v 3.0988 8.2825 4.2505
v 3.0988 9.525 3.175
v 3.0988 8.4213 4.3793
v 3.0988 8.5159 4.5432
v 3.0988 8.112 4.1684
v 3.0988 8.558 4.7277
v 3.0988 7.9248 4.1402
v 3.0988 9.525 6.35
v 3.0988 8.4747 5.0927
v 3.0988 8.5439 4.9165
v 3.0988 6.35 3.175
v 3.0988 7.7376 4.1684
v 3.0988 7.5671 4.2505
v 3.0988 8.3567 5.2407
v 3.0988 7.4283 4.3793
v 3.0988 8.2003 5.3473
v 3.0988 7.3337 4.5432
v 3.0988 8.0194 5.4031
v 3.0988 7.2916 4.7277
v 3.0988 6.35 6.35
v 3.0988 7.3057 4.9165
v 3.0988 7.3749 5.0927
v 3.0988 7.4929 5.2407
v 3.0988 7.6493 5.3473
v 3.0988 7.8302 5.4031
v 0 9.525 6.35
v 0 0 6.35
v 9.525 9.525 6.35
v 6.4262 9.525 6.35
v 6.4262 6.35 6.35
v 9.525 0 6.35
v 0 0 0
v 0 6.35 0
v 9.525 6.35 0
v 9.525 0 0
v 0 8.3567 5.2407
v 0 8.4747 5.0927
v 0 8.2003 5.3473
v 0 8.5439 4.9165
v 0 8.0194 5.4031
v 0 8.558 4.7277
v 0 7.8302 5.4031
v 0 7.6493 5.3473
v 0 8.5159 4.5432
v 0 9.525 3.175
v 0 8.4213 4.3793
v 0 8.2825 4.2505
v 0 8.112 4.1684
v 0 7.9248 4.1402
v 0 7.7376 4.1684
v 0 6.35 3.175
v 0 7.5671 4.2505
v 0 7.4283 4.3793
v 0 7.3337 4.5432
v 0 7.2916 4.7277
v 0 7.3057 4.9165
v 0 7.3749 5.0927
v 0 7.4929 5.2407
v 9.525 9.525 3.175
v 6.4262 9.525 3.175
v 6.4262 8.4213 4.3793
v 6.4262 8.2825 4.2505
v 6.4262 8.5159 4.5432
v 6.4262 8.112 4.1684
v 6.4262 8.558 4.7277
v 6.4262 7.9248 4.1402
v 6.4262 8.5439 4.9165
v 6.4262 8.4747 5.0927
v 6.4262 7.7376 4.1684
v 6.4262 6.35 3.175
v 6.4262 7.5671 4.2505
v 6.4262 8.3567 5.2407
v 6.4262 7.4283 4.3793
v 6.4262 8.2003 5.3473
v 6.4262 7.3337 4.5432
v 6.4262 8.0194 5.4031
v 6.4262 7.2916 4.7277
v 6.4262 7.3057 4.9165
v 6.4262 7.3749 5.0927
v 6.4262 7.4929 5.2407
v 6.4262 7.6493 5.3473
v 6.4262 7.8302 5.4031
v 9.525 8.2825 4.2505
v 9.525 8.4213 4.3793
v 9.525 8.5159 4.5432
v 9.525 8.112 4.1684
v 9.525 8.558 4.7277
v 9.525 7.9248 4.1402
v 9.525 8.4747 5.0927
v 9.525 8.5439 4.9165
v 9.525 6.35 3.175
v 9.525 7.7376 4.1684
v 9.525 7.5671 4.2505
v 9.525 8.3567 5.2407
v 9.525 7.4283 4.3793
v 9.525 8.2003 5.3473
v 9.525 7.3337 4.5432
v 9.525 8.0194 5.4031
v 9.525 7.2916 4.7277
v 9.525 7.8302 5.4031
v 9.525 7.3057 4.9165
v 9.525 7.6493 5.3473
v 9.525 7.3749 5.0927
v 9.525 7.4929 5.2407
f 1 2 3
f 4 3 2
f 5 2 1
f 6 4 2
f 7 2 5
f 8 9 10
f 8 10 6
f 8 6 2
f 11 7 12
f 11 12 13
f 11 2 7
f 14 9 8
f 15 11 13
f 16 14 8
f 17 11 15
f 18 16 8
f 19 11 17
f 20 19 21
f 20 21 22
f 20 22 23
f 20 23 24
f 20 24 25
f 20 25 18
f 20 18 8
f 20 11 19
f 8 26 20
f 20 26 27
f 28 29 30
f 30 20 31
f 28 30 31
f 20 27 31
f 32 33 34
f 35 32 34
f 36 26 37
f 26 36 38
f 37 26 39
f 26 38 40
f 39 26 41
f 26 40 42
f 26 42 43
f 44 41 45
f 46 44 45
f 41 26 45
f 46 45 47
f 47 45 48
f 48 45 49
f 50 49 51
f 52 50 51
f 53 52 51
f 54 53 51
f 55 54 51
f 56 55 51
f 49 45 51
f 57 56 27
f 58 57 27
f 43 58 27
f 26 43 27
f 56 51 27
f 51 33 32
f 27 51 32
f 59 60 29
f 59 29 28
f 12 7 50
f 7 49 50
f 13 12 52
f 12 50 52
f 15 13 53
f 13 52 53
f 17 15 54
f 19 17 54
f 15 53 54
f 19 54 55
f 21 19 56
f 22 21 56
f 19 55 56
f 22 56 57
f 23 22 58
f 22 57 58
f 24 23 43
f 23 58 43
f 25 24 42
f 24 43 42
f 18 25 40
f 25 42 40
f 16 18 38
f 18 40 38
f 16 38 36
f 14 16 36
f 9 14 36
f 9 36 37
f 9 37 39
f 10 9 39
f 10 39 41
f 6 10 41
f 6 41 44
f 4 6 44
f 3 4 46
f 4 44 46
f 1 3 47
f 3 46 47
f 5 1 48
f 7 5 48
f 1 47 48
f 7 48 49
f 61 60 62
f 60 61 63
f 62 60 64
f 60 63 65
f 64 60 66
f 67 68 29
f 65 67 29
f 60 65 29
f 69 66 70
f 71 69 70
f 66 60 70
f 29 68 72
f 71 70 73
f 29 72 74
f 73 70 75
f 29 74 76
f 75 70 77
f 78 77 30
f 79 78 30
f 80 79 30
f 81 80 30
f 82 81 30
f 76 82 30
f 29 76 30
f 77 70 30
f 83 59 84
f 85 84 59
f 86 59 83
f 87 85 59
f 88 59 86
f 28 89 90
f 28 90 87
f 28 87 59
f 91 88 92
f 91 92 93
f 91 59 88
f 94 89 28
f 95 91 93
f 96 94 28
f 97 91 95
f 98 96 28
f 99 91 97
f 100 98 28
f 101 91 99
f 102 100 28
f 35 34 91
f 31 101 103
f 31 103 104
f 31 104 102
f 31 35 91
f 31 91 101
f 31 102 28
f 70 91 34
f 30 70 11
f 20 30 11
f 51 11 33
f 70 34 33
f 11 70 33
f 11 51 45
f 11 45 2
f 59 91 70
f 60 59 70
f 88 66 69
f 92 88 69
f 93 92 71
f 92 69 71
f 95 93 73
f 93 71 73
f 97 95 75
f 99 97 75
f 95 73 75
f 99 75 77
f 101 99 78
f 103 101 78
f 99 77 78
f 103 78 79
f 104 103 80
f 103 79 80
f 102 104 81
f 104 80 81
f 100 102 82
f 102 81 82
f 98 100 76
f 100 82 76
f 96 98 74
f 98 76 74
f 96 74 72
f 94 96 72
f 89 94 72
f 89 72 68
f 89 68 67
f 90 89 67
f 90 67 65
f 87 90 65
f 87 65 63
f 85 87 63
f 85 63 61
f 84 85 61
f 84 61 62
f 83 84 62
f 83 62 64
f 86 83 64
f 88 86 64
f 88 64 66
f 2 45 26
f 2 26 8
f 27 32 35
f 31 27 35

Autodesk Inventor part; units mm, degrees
ref_plane "YZ Plane" through (0, 0, 0) normal (1, 0, 0) x (0, 1, 0)
ref_plane "XZ Plane" through (0, 0, 0) normal (0, 1, 0) x (-1, 0, 0)
ref_plane "XY Plane" through (0, 0, 0) normal (0, 0, 1) x (1, 0, 0)
sketch "Sketch1" plane through (0, 0, 0) normal (0, 0, 1) x (1, 0, 0)
  line L0 (0, 0) -> (9.525, 0)
  line L1 (9.525, 0) -> (9.525, 6.35)
  line L2 (9.525, 6.35) -> (0, 6.35)
  line L3 (0, 6.35) -> (0, 0)
  dimension "d0" = 9.525
  dimension "d1" = 6.35
extrude "Extrusion1" add sketch "Sketch1" along normal blind 6.35
sketch "Sketch2" plane through (0, 6.35, 0) normal (0, 1, 0) x (1, 0, 0)
  point P0 (0, 0)
sketch "Sketch3" plane through (0, 6.35, 0) normal (0, 1, 0) x (1, 0, 0)
  line L0 (0, 0) -> (0, -6.35) projected
  line L1 (0, -6.35) -> (9.525, -6.35) projected
  line L2 (0, -3.175) -> (3.0988, -3.175)
  line L3 (3.0988, -3.175) -> (3.0988, -6.35)
  line L4 (3.0988, -6.35) -> (0, -6.35)
  line L5 (0, -6.35) -> (0, -3.175)
  dimension "d4" = 3.0988
extrude "Extrusion2" add sketch "Sketch3" along normal blind 3.175
sketch "Sketch4" plane through (0, 6.35, 0) normal (0, 1, 0) x (1, 0, 0)
  line L0 (9.525, 0) -> (9.525, -6.35) projected
  line L1 (0, -6.35) -> (9.525, -6.35) projected
  line L2 (9.525, -3.175) -> (6.4262, -3.175)
  line L3 (6.4262, -3.175) -> (6.4262, -6.35)
  line L4 (6.4262, -6.35) -> (9.525, -6.35)
  line L5 (9.525, -6.35) -> (9.525, -3.175)
  point P0 (0, 0)
  dimension "d7" = 3.0988
extrude "Extrusion3" add sketch "Sketch4" along normal blind 3.175
hole "Hole1" at (9.525, 7.9248, 4.7752) direction (-1, 0, 0) diameter 1.27 end through all
properties part number "HingePart2MK2"
